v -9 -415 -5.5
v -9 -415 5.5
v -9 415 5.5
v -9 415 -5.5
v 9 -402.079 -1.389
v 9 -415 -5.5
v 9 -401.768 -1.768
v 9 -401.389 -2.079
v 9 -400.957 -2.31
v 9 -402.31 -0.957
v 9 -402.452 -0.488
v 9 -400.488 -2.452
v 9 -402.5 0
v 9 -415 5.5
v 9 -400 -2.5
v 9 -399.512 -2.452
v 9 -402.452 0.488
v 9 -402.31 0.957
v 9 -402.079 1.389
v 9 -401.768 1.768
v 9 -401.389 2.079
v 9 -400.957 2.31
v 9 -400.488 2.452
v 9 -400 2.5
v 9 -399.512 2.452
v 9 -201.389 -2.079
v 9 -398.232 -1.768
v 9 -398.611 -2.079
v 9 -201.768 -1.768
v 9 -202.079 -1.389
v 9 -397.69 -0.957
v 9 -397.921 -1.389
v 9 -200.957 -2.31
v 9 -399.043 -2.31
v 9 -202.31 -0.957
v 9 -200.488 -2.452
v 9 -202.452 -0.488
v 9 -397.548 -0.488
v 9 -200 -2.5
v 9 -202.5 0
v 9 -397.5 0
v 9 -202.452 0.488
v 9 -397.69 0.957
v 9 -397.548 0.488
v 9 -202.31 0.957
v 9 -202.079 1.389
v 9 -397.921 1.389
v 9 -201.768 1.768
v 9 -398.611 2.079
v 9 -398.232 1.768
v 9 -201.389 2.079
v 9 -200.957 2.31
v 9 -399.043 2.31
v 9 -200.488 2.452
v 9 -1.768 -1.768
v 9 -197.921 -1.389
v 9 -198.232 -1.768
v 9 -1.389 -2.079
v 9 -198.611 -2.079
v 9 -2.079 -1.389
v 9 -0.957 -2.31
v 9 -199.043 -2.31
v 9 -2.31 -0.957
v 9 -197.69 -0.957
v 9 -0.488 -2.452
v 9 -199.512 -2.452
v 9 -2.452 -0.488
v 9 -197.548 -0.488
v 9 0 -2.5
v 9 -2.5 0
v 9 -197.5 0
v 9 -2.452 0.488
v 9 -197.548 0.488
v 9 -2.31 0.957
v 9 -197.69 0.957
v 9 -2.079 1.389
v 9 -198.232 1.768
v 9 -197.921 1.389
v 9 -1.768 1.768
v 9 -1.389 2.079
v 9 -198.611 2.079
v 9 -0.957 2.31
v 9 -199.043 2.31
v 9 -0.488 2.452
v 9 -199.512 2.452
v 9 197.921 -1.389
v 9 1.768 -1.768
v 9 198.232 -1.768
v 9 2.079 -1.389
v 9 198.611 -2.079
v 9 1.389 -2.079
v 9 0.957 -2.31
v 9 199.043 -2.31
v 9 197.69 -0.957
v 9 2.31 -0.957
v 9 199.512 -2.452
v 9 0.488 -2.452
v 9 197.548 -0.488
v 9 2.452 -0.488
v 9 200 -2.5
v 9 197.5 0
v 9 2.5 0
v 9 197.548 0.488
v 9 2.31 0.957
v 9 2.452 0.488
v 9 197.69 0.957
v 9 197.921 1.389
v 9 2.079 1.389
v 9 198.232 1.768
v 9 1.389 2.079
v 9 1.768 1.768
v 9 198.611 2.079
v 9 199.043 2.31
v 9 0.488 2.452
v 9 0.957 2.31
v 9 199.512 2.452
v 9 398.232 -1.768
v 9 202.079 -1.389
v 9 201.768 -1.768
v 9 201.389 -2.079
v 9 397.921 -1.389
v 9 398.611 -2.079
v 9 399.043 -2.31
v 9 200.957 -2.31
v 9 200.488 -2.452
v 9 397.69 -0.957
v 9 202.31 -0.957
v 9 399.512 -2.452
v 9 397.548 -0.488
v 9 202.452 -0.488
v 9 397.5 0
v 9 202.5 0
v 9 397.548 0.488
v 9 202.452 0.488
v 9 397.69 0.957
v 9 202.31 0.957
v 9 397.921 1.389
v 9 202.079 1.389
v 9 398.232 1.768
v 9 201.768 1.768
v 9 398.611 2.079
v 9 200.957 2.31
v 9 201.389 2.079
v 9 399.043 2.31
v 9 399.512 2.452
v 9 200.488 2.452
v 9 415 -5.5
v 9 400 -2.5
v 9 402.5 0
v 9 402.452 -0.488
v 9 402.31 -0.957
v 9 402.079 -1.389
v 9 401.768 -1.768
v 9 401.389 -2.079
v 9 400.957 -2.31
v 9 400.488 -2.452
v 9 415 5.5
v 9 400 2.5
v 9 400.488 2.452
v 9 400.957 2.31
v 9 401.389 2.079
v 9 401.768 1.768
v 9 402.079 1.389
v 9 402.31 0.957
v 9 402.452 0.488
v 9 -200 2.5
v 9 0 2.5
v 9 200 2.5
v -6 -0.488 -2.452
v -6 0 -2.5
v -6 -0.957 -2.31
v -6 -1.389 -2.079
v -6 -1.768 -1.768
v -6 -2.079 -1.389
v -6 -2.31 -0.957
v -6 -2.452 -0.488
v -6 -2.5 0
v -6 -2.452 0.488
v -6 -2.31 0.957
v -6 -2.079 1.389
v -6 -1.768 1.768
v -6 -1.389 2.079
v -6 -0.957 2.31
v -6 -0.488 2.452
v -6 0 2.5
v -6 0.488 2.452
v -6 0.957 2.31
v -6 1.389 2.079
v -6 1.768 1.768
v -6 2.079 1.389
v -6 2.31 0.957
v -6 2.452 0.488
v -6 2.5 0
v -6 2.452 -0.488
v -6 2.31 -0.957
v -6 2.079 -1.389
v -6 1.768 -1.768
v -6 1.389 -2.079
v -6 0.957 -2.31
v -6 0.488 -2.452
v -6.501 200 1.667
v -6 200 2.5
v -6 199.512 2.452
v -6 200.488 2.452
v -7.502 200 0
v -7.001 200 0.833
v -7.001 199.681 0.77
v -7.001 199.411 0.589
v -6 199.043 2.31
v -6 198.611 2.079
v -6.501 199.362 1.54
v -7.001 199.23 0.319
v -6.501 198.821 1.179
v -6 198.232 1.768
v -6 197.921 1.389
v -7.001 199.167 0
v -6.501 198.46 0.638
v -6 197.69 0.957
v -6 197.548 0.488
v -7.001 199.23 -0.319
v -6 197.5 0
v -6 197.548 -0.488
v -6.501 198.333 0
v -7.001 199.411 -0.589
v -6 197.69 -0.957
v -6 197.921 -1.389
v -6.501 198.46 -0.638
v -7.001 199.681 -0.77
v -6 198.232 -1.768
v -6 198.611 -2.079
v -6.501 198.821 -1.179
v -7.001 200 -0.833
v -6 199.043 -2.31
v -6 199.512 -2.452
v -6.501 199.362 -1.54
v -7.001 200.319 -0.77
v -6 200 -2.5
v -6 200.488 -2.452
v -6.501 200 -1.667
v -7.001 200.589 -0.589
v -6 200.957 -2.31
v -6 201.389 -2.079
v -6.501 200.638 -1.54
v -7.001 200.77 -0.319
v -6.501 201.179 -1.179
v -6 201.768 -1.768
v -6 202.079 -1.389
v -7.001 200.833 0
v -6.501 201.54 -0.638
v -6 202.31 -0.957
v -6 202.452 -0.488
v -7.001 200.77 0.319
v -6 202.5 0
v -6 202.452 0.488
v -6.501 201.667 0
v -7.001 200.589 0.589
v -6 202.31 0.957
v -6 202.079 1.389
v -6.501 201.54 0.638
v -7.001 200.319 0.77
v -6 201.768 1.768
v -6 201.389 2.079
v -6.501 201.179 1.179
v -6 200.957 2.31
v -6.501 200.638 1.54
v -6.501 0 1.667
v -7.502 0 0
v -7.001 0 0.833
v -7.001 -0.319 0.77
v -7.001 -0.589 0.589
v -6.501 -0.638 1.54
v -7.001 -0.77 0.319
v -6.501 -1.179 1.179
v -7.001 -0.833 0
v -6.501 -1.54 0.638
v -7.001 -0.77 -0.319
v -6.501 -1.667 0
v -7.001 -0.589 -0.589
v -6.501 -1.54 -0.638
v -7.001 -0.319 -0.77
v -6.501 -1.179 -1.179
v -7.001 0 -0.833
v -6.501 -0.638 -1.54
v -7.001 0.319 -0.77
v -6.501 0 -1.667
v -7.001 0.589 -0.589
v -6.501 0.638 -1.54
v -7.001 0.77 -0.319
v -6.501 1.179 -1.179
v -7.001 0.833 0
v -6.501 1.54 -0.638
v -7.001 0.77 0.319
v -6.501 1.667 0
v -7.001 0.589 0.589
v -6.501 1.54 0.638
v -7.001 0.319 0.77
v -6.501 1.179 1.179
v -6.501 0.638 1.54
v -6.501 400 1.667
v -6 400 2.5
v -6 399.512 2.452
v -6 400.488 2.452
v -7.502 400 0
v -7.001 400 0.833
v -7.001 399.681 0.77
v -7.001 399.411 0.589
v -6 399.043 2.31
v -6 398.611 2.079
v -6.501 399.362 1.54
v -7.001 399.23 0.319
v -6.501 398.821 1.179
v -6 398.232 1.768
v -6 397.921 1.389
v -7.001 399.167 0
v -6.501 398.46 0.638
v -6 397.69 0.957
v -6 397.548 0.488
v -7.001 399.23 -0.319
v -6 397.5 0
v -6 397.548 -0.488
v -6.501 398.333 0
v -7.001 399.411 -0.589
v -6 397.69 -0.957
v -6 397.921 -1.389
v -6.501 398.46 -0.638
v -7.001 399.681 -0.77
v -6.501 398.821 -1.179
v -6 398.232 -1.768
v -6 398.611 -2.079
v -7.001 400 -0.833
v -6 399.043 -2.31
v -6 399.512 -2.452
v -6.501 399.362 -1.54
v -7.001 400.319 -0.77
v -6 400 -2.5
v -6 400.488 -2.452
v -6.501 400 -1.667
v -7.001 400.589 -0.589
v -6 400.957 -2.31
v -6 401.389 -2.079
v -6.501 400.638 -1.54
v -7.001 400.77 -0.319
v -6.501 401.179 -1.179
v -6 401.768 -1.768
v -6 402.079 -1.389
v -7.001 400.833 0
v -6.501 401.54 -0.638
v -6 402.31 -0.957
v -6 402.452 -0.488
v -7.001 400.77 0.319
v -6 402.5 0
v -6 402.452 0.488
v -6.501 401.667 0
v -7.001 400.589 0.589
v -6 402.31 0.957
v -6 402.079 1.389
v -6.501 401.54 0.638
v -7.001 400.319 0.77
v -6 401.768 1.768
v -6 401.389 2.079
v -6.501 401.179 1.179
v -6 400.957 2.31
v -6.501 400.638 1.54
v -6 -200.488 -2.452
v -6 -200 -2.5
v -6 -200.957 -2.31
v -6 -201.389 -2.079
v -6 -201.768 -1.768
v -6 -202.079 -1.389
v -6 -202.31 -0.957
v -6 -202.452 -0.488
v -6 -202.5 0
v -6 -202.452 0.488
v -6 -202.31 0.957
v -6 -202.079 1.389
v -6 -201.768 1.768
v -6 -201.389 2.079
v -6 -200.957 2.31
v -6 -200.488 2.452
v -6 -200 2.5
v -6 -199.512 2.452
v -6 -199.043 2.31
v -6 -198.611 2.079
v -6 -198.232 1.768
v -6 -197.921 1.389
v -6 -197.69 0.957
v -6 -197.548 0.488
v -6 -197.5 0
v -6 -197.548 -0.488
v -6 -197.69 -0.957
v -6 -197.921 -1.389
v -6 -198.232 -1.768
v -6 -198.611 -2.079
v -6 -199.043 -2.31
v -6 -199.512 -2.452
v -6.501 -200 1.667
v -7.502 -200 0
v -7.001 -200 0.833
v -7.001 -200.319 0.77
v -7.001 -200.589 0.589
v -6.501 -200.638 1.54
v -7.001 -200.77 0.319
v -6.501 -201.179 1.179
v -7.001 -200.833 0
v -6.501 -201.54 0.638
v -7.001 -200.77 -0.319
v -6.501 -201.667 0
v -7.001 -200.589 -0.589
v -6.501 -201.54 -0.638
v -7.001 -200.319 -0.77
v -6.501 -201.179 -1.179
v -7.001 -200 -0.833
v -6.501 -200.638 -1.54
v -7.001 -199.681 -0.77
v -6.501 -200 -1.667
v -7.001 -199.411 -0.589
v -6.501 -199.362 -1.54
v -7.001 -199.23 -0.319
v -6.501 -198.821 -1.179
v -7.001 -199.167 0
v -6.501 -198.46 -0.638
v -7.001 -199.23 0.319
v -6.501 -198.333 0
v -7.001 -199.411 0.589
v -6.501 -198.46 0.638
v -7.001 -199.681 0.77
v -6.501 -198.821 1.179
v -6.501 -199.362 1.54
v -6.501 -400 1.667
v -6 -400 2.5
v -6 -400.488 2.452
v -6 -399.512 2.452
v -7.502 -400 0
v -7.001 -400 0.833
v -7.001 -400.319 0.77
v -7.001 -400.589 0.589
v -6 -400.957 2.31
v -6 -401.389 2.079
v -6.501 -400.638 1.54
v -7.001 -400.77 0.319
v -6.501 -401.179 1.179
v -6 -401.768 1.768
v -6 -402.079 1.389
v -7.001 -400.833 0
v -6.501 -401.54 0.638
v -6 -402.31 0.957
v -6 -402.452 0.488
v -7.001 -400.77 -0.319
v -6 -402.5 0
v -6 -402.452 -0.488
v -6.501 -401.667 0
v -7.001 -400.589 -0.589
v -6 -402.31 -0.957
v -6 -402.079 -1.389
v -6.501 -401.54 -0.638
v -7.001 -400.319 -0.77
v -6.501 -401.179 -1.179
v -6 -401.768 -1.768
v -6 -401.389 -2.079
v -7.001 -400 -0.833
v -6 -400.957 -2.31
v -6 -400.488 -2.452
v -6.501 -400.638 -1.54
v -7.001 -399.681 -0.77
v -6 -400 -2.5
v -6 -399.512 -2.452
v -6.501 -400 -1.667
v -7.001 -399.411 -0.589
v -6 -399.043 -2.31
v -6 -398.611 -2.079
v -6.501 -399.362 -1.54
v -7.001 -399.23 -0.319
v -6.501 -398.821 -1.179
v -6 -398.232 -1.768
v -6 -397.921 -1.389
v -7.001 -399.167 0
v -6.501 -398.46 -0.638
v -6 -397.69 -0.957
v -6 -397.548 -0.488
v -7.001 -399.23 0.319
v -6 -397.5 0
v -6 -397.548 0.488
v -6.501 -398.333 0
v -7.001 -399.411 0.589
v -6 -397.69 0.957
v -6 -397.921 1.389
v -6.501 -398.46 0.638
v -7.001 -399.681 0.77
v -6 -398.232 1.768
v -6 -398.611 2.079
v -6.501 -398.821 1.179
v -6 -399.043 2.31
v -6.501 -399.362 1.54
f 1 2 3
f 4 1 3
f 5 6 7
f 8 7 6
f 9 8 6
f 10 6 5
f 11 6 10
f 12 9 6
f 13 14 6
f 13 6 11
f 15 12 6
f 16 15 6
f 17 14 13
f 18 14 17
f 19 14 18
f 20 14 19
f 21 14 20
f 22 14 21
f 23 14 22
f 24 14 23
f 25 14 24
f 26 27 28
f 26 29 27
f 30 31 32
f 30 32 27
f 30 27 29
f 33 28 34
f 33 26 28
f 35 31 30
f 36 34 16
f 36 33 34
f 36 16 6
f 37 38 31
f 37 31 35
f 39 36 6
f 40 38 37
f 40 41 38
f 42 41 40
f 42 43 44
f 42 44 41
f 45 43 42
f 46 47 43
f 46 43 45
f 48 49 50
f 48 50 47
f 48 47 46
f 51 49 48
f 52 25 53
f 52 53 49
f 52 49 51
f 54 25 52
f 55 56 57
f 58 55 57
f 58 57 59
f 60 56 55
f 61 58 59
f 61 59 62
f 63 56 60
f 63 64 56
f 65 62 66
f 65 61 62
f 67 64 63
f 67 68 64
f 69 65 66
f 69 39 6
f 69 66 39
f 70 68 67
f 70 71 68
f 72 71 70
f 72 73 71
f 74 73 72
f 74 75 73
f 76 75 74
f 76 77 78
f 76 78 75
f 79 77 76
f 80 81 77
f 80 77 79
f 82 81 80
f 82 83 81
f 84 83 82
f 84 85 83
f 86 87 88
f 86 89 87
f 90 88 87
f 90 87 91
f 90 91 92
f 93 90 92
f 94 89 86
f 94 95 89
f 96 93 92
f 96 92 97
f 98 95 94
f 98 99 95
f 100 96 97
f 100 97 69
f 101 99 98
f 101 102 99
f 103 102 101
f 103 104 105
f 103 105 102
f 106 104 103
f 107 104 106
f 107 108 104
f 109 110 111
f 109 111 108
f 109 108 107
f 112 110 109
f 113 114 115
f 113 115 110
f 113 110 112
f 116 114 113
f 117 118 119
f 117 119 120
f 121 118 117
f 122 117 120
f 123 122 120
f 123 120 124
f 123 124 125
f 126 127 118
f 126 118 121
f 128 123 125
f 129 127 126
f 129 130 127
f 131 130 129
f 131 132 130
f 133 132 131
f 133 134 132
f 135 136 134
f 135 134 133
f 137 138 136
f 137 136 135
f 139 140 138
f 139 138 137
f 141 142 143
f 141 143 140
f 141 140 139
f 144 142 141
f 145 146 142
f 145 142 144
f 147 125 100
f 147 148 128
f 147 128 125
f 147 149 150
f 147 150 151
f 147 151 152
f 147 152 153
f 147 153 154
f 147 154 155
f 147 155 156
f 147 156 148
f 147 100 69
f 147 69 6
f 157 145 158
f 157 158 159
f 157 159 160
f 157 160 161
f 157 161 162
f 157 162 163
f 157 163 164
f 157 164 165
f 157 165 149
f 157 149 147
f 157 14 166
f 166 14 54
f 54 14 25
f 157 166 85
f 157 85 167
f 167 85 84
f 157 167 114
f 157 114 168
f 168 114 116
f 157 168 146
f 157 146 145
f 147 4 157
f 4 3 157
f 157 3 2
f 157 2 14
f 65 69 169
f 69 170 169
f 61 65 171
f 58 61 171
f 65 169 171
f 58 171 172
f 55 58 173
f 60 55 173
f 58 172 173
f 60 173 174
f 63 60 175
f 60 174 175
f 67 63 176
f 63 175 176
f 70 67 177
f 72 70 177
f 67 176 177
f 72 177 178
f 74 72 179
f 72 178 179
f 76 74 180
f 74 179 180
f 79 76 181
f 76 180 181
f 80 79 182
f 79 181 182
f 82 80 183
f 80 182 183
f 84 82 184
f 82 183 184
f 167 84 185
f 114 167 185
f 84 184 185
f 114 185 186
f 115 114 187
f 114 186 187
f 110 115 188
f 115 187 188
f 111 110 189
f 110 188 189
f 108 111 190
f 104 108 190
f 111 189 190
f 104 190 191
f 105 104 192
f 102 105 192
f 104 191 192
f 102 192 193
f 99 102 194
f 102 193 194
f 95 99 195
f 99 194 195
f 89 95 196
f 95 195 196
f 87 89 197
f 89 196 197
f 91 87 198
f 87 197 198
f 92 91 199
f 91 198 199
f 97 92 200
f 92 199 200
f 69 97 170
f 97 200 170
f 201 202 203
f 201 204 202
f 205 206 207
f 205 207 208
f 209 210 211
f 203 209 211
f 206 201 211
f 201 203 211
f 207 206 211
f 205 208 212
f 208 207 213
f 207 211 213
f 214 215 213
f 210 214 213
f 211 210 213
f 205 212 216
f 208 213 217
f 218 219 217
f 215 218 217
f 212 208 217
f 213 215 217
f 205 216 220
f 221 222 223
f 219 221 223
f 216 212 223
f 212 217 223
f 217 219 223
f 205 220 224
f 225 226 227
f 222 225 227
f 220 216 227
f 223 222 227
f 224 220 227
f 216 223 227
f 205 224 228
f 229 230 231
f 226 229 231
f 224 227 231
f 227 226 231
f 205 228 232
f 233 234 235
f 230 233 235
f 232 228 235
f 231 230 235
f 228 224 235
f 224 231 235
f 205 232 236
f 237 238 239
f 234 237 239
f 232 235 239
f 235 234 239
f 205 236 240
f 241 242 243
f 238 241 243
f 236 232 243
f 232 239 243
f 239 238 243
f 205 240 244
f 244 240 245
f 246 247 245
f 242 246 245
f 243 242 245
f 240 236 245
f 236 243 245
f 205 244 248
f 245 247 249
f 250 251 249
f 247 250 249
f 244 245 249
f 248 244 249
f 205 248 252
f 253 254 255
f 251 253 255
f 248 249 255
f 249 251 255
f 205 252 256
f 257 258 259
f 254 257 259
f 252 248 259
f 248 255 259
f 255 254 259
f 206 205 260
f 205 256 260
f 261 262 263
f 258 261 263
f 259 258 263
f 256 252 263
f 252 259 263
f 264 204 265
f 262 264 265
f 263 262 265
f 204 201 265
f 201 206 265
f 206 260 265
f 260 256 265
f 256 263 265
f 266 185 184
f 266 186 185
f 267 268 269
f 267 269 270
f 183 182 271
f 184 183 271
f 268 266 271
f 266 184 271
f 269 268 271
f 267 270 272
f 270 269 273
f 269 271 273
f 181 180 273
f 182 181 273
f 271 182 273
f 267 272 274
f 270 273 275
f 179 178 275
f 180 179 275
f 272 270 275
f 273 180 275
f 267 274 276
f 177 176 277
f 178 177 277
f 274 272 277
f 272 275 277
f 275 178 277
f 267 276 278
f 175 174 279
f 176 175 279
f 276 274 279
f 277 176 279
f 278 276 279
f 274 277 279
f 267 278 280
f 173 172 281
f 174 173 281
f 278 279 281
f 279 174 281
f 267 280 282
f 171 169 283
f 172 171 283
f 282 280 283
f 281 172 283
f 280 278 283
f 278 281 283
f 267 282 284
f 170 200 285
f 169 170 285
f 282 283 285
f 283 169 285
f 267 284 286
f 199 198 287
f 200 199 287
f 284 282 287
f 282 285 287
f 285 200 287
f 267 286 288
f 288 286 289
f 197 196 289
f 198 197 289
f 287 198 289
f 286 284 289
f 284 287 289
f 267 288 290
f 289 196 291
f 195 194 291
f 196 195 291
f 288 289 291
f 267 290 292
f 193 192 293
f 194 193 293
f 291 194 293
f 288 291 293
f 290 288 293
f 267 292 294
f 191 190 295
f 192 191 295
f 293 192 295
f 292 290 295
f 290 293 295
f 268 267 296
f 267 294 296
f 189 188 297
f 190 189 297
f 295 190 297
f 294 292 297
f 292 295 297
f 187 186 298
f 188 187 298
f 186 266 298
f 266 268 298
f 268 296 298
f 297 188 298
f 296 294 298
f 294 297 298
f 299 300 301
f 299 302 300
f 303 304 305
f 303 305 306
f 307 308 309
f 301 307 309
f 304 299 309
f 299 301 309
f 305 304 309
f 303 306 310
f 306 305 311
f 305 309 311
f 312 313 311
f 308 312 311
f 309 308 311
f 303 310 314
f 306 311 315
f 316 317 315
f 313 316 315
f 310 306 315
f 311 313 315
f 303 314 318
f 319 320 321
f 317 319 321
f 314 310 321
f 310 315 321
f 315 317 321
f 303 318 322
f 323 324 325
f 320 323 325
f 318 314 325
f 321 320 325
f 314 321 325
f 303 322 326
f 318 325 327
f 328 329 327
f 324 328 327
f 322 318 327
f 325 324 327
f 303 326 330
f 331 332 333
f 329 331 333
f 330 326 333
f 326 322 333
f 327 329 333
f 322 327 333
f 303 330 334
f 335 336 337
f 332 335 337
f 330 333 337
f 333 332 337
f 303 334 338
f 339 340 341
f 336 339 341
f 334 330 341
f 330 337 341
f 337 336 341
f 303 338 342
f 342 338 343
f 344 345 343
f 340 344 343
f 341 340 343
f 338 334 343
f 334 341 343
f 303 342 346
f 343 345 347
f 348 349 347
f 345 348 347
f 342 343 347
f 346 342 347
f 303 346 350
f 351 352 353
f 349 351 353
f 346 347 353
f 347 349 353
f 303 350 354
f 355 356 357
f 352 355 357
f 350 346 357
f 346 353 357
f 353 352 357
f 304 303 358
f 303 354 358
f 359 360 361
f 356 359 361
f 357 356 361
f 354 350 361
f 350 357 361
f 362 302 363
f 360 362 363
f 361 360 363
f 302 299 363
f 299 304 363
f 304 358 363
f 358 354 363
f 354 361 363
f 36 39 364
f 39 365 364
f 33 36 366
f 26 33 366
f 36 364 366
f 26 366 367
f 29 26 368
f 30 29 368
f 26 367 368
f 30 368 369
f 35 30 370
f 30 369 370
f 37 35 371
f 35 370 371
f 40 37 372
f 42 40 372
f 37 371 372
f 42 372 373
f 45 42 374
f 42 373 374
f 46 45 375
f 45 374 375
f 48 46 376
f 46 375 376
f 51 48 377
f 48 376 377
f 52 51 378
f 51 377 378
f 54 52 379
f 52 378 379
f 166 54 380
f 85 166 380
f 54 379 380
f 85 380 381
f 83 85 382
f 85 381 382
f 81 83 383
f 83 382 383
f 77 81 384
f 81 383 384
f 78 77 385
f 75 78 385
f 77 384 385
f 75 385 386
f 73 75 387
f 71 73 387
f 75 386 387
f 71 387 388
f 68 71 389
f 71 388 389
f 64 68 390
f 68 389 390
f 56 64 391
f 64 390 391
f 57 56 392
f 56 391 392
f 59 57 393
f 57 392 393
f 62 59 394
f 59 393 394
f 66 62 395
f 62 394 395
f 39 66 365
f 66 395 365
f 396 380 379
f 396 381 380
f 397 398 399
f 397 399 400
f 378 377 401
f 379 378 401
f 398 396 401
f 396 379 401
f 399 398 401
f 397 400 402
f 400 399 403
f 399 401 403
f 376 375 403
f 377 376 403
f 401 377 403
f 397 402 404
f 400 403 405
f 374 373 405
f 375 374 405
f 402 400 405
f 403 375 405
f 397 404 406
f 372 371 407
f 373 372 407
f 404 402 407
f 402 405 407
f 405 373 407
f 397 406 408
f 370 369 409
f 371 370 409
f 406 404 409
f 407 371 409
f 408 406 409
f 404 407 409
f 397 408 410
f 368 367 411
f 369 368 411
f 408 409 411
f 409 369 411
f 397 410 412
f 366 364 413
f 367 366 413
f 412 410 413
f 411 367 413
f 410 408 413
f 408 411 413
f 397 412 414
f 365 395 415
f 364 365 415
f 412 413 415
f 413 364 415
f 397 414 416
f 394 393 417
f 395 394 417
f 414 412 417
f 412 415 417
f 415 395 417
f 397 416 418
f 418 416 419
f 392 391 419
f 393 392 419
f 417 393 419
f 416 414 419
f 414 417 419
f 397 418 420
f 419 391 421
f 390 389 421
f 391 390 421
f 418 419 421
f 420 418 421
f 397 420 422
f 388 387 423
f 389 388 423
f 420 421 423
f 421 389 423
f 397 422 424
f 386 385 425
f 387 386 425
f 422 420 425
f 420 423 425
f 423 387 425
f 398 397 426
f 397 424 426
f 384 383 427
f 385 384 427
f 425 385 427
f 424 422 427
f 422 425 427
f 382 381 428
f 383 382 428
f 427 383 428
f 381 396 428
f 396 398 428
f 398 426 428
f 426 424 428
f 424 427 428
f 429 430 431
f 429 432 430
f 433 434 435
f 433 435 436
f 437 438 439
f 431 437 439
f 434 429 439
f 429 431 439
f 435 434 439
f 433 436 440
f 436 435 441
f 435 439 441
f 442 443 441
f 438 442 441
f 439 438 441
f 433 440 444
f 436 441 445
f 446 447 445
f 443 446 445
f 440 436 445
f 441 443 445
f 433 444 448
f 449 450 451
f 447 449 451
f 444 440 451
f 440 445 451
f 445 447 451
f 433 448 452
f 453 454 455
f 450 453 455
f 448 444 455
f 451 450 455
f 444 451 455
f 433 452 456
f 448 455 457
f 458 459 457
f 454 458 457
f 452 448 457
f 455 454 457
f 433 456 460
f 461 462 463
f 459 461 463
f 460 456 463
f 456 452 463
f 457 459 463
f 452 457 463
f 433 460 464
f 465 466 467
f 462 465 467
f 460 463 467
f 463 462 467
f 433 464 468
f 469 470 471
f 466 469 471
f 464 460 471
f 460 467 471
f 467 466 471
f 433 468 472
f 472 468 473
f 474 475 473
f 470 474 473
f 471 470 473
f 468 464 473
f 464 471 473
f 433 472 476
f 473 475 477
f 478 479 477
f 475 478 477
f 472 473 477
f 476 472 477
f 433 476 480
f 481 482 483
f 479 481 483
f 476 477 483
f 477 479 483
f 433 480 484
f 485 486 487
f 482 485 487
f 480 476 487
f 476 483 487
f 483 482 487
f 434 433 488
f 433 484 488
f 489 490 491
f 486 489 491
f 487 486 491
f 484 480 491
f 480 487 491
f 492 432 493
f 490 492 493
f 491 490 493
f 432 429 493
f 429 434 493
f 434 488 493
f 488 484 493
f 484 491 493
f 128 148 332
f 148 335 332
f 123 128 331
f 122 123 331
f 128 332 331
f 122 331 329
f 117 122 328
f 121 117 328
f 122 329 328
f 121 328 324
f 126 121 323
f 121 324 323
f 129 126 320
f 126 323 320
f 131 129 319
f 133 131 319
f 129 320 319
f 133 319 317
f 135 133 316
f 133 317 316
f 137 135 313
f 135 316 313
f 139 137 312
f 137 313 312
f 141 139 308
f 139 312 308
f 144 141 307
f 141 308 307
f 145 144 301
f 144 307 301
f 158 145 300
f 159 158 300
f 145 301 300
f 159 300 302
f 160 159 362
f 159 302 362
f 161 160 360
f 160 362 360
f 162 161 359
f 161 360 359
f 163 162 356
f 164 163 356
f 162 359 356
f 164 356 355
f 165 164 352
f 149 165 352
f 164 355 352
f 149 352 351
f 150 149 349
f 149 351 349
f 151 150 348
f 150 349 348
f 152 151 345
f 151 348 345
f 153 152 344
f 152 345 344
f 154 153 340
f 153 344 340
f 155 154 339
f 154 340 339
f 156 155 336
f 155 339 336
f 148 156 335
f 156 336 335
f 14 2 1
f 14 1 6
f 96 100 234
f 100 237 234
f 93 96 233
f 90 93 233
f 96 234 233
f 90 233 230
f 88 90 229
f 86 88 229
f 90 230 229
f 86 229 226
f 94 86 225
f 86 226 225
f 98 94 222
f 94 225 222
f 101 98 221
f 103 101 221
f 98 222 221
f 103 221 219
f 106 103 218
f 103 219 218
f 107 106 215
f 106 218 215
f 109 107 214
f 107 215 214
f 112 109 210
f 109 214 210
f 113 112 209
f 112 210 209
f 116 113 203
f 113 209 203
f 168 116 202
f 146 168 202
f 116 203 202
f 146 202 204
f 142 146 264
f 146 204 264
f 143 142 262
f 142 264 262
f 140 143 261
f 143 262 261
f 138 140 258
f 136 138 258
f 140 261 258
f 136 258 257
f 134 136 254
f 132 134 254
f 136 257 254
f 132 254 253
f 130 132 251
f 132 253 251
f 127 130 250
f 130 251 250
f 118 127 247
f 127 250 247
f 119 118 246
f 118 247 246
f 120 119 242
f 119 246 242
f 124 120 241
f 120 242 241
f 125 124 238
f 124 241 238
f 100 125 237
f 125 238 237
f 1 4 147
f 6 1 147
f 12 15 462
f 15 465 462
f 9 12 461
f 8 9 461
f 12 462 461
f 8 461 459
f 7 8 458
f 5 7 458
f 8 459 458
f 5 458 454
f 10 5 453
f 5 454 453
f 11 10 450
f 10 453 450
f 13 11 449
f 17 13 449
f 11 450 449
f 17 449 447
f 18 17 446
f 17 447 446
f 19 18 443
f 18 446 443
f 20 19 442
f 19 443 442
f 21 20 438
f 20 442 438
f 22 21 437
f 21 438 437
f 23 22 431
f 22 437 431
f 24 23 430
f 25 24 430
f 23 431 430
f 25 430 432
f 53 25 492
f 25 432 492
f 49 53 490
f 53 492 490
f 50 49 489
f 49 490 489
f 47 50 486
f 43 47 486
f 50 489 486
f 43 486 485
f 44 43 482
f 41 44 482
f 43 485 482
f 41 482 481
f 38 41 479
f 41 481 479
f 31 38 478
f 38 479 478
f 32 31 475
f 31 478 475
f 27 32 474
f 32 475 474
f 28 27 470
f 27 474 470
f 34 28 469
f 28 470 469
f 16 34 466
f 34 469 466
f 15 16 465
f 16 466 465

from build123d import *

# Parameters (mm, degrees)
SKETCH_1_W             = 18
SKETCH_1_H             = 830
EXTRUDE_1_DEPTH        = 5.5
HOLE_WIZARD_M6_1_D     = 5
HOLE_WIZARD_M6_1_DEPTH = 15
HOLE_WIZARD_M6_1_TIP   = 1.502151548


with BuildPart() as part:
    # 草图1 → 凸台-拉伸1 (new body, symmetric)
    with BuildSketch(Plane.XY):
        Rectangle(SKETCH_1_W, SKETCH_1_H)
    extrude(amount=EXTRUDE_1_DEPTH, both=True)

    # M6 螺纹孔1
    with Locations(Plane(origin=(9, -400, 0), x_dir=(0, 0, 1), z_dir=(1, 0, 0))):
        with Locations((0, 0), (0, -200), (0, -400), (0, -600), (0, -800)):
            Hole(HOLE_WIZARD_M6_1_D / 2, depth=HOLE_WIZARD_M6_1_DEPTH)
            with Locations((0, 0, -(HOLE_WIZARD_M6_1_DEPTH + HOLE_WIZARD_M6_1_TIP / 2))):  # 118° drill point
                Cone(0, HOLE_WIZARD_M6_1_D / 2, HOLE_WIZARD_M6_1_TIP, mode=Mode.SUBTRACT)


solid = part.part
